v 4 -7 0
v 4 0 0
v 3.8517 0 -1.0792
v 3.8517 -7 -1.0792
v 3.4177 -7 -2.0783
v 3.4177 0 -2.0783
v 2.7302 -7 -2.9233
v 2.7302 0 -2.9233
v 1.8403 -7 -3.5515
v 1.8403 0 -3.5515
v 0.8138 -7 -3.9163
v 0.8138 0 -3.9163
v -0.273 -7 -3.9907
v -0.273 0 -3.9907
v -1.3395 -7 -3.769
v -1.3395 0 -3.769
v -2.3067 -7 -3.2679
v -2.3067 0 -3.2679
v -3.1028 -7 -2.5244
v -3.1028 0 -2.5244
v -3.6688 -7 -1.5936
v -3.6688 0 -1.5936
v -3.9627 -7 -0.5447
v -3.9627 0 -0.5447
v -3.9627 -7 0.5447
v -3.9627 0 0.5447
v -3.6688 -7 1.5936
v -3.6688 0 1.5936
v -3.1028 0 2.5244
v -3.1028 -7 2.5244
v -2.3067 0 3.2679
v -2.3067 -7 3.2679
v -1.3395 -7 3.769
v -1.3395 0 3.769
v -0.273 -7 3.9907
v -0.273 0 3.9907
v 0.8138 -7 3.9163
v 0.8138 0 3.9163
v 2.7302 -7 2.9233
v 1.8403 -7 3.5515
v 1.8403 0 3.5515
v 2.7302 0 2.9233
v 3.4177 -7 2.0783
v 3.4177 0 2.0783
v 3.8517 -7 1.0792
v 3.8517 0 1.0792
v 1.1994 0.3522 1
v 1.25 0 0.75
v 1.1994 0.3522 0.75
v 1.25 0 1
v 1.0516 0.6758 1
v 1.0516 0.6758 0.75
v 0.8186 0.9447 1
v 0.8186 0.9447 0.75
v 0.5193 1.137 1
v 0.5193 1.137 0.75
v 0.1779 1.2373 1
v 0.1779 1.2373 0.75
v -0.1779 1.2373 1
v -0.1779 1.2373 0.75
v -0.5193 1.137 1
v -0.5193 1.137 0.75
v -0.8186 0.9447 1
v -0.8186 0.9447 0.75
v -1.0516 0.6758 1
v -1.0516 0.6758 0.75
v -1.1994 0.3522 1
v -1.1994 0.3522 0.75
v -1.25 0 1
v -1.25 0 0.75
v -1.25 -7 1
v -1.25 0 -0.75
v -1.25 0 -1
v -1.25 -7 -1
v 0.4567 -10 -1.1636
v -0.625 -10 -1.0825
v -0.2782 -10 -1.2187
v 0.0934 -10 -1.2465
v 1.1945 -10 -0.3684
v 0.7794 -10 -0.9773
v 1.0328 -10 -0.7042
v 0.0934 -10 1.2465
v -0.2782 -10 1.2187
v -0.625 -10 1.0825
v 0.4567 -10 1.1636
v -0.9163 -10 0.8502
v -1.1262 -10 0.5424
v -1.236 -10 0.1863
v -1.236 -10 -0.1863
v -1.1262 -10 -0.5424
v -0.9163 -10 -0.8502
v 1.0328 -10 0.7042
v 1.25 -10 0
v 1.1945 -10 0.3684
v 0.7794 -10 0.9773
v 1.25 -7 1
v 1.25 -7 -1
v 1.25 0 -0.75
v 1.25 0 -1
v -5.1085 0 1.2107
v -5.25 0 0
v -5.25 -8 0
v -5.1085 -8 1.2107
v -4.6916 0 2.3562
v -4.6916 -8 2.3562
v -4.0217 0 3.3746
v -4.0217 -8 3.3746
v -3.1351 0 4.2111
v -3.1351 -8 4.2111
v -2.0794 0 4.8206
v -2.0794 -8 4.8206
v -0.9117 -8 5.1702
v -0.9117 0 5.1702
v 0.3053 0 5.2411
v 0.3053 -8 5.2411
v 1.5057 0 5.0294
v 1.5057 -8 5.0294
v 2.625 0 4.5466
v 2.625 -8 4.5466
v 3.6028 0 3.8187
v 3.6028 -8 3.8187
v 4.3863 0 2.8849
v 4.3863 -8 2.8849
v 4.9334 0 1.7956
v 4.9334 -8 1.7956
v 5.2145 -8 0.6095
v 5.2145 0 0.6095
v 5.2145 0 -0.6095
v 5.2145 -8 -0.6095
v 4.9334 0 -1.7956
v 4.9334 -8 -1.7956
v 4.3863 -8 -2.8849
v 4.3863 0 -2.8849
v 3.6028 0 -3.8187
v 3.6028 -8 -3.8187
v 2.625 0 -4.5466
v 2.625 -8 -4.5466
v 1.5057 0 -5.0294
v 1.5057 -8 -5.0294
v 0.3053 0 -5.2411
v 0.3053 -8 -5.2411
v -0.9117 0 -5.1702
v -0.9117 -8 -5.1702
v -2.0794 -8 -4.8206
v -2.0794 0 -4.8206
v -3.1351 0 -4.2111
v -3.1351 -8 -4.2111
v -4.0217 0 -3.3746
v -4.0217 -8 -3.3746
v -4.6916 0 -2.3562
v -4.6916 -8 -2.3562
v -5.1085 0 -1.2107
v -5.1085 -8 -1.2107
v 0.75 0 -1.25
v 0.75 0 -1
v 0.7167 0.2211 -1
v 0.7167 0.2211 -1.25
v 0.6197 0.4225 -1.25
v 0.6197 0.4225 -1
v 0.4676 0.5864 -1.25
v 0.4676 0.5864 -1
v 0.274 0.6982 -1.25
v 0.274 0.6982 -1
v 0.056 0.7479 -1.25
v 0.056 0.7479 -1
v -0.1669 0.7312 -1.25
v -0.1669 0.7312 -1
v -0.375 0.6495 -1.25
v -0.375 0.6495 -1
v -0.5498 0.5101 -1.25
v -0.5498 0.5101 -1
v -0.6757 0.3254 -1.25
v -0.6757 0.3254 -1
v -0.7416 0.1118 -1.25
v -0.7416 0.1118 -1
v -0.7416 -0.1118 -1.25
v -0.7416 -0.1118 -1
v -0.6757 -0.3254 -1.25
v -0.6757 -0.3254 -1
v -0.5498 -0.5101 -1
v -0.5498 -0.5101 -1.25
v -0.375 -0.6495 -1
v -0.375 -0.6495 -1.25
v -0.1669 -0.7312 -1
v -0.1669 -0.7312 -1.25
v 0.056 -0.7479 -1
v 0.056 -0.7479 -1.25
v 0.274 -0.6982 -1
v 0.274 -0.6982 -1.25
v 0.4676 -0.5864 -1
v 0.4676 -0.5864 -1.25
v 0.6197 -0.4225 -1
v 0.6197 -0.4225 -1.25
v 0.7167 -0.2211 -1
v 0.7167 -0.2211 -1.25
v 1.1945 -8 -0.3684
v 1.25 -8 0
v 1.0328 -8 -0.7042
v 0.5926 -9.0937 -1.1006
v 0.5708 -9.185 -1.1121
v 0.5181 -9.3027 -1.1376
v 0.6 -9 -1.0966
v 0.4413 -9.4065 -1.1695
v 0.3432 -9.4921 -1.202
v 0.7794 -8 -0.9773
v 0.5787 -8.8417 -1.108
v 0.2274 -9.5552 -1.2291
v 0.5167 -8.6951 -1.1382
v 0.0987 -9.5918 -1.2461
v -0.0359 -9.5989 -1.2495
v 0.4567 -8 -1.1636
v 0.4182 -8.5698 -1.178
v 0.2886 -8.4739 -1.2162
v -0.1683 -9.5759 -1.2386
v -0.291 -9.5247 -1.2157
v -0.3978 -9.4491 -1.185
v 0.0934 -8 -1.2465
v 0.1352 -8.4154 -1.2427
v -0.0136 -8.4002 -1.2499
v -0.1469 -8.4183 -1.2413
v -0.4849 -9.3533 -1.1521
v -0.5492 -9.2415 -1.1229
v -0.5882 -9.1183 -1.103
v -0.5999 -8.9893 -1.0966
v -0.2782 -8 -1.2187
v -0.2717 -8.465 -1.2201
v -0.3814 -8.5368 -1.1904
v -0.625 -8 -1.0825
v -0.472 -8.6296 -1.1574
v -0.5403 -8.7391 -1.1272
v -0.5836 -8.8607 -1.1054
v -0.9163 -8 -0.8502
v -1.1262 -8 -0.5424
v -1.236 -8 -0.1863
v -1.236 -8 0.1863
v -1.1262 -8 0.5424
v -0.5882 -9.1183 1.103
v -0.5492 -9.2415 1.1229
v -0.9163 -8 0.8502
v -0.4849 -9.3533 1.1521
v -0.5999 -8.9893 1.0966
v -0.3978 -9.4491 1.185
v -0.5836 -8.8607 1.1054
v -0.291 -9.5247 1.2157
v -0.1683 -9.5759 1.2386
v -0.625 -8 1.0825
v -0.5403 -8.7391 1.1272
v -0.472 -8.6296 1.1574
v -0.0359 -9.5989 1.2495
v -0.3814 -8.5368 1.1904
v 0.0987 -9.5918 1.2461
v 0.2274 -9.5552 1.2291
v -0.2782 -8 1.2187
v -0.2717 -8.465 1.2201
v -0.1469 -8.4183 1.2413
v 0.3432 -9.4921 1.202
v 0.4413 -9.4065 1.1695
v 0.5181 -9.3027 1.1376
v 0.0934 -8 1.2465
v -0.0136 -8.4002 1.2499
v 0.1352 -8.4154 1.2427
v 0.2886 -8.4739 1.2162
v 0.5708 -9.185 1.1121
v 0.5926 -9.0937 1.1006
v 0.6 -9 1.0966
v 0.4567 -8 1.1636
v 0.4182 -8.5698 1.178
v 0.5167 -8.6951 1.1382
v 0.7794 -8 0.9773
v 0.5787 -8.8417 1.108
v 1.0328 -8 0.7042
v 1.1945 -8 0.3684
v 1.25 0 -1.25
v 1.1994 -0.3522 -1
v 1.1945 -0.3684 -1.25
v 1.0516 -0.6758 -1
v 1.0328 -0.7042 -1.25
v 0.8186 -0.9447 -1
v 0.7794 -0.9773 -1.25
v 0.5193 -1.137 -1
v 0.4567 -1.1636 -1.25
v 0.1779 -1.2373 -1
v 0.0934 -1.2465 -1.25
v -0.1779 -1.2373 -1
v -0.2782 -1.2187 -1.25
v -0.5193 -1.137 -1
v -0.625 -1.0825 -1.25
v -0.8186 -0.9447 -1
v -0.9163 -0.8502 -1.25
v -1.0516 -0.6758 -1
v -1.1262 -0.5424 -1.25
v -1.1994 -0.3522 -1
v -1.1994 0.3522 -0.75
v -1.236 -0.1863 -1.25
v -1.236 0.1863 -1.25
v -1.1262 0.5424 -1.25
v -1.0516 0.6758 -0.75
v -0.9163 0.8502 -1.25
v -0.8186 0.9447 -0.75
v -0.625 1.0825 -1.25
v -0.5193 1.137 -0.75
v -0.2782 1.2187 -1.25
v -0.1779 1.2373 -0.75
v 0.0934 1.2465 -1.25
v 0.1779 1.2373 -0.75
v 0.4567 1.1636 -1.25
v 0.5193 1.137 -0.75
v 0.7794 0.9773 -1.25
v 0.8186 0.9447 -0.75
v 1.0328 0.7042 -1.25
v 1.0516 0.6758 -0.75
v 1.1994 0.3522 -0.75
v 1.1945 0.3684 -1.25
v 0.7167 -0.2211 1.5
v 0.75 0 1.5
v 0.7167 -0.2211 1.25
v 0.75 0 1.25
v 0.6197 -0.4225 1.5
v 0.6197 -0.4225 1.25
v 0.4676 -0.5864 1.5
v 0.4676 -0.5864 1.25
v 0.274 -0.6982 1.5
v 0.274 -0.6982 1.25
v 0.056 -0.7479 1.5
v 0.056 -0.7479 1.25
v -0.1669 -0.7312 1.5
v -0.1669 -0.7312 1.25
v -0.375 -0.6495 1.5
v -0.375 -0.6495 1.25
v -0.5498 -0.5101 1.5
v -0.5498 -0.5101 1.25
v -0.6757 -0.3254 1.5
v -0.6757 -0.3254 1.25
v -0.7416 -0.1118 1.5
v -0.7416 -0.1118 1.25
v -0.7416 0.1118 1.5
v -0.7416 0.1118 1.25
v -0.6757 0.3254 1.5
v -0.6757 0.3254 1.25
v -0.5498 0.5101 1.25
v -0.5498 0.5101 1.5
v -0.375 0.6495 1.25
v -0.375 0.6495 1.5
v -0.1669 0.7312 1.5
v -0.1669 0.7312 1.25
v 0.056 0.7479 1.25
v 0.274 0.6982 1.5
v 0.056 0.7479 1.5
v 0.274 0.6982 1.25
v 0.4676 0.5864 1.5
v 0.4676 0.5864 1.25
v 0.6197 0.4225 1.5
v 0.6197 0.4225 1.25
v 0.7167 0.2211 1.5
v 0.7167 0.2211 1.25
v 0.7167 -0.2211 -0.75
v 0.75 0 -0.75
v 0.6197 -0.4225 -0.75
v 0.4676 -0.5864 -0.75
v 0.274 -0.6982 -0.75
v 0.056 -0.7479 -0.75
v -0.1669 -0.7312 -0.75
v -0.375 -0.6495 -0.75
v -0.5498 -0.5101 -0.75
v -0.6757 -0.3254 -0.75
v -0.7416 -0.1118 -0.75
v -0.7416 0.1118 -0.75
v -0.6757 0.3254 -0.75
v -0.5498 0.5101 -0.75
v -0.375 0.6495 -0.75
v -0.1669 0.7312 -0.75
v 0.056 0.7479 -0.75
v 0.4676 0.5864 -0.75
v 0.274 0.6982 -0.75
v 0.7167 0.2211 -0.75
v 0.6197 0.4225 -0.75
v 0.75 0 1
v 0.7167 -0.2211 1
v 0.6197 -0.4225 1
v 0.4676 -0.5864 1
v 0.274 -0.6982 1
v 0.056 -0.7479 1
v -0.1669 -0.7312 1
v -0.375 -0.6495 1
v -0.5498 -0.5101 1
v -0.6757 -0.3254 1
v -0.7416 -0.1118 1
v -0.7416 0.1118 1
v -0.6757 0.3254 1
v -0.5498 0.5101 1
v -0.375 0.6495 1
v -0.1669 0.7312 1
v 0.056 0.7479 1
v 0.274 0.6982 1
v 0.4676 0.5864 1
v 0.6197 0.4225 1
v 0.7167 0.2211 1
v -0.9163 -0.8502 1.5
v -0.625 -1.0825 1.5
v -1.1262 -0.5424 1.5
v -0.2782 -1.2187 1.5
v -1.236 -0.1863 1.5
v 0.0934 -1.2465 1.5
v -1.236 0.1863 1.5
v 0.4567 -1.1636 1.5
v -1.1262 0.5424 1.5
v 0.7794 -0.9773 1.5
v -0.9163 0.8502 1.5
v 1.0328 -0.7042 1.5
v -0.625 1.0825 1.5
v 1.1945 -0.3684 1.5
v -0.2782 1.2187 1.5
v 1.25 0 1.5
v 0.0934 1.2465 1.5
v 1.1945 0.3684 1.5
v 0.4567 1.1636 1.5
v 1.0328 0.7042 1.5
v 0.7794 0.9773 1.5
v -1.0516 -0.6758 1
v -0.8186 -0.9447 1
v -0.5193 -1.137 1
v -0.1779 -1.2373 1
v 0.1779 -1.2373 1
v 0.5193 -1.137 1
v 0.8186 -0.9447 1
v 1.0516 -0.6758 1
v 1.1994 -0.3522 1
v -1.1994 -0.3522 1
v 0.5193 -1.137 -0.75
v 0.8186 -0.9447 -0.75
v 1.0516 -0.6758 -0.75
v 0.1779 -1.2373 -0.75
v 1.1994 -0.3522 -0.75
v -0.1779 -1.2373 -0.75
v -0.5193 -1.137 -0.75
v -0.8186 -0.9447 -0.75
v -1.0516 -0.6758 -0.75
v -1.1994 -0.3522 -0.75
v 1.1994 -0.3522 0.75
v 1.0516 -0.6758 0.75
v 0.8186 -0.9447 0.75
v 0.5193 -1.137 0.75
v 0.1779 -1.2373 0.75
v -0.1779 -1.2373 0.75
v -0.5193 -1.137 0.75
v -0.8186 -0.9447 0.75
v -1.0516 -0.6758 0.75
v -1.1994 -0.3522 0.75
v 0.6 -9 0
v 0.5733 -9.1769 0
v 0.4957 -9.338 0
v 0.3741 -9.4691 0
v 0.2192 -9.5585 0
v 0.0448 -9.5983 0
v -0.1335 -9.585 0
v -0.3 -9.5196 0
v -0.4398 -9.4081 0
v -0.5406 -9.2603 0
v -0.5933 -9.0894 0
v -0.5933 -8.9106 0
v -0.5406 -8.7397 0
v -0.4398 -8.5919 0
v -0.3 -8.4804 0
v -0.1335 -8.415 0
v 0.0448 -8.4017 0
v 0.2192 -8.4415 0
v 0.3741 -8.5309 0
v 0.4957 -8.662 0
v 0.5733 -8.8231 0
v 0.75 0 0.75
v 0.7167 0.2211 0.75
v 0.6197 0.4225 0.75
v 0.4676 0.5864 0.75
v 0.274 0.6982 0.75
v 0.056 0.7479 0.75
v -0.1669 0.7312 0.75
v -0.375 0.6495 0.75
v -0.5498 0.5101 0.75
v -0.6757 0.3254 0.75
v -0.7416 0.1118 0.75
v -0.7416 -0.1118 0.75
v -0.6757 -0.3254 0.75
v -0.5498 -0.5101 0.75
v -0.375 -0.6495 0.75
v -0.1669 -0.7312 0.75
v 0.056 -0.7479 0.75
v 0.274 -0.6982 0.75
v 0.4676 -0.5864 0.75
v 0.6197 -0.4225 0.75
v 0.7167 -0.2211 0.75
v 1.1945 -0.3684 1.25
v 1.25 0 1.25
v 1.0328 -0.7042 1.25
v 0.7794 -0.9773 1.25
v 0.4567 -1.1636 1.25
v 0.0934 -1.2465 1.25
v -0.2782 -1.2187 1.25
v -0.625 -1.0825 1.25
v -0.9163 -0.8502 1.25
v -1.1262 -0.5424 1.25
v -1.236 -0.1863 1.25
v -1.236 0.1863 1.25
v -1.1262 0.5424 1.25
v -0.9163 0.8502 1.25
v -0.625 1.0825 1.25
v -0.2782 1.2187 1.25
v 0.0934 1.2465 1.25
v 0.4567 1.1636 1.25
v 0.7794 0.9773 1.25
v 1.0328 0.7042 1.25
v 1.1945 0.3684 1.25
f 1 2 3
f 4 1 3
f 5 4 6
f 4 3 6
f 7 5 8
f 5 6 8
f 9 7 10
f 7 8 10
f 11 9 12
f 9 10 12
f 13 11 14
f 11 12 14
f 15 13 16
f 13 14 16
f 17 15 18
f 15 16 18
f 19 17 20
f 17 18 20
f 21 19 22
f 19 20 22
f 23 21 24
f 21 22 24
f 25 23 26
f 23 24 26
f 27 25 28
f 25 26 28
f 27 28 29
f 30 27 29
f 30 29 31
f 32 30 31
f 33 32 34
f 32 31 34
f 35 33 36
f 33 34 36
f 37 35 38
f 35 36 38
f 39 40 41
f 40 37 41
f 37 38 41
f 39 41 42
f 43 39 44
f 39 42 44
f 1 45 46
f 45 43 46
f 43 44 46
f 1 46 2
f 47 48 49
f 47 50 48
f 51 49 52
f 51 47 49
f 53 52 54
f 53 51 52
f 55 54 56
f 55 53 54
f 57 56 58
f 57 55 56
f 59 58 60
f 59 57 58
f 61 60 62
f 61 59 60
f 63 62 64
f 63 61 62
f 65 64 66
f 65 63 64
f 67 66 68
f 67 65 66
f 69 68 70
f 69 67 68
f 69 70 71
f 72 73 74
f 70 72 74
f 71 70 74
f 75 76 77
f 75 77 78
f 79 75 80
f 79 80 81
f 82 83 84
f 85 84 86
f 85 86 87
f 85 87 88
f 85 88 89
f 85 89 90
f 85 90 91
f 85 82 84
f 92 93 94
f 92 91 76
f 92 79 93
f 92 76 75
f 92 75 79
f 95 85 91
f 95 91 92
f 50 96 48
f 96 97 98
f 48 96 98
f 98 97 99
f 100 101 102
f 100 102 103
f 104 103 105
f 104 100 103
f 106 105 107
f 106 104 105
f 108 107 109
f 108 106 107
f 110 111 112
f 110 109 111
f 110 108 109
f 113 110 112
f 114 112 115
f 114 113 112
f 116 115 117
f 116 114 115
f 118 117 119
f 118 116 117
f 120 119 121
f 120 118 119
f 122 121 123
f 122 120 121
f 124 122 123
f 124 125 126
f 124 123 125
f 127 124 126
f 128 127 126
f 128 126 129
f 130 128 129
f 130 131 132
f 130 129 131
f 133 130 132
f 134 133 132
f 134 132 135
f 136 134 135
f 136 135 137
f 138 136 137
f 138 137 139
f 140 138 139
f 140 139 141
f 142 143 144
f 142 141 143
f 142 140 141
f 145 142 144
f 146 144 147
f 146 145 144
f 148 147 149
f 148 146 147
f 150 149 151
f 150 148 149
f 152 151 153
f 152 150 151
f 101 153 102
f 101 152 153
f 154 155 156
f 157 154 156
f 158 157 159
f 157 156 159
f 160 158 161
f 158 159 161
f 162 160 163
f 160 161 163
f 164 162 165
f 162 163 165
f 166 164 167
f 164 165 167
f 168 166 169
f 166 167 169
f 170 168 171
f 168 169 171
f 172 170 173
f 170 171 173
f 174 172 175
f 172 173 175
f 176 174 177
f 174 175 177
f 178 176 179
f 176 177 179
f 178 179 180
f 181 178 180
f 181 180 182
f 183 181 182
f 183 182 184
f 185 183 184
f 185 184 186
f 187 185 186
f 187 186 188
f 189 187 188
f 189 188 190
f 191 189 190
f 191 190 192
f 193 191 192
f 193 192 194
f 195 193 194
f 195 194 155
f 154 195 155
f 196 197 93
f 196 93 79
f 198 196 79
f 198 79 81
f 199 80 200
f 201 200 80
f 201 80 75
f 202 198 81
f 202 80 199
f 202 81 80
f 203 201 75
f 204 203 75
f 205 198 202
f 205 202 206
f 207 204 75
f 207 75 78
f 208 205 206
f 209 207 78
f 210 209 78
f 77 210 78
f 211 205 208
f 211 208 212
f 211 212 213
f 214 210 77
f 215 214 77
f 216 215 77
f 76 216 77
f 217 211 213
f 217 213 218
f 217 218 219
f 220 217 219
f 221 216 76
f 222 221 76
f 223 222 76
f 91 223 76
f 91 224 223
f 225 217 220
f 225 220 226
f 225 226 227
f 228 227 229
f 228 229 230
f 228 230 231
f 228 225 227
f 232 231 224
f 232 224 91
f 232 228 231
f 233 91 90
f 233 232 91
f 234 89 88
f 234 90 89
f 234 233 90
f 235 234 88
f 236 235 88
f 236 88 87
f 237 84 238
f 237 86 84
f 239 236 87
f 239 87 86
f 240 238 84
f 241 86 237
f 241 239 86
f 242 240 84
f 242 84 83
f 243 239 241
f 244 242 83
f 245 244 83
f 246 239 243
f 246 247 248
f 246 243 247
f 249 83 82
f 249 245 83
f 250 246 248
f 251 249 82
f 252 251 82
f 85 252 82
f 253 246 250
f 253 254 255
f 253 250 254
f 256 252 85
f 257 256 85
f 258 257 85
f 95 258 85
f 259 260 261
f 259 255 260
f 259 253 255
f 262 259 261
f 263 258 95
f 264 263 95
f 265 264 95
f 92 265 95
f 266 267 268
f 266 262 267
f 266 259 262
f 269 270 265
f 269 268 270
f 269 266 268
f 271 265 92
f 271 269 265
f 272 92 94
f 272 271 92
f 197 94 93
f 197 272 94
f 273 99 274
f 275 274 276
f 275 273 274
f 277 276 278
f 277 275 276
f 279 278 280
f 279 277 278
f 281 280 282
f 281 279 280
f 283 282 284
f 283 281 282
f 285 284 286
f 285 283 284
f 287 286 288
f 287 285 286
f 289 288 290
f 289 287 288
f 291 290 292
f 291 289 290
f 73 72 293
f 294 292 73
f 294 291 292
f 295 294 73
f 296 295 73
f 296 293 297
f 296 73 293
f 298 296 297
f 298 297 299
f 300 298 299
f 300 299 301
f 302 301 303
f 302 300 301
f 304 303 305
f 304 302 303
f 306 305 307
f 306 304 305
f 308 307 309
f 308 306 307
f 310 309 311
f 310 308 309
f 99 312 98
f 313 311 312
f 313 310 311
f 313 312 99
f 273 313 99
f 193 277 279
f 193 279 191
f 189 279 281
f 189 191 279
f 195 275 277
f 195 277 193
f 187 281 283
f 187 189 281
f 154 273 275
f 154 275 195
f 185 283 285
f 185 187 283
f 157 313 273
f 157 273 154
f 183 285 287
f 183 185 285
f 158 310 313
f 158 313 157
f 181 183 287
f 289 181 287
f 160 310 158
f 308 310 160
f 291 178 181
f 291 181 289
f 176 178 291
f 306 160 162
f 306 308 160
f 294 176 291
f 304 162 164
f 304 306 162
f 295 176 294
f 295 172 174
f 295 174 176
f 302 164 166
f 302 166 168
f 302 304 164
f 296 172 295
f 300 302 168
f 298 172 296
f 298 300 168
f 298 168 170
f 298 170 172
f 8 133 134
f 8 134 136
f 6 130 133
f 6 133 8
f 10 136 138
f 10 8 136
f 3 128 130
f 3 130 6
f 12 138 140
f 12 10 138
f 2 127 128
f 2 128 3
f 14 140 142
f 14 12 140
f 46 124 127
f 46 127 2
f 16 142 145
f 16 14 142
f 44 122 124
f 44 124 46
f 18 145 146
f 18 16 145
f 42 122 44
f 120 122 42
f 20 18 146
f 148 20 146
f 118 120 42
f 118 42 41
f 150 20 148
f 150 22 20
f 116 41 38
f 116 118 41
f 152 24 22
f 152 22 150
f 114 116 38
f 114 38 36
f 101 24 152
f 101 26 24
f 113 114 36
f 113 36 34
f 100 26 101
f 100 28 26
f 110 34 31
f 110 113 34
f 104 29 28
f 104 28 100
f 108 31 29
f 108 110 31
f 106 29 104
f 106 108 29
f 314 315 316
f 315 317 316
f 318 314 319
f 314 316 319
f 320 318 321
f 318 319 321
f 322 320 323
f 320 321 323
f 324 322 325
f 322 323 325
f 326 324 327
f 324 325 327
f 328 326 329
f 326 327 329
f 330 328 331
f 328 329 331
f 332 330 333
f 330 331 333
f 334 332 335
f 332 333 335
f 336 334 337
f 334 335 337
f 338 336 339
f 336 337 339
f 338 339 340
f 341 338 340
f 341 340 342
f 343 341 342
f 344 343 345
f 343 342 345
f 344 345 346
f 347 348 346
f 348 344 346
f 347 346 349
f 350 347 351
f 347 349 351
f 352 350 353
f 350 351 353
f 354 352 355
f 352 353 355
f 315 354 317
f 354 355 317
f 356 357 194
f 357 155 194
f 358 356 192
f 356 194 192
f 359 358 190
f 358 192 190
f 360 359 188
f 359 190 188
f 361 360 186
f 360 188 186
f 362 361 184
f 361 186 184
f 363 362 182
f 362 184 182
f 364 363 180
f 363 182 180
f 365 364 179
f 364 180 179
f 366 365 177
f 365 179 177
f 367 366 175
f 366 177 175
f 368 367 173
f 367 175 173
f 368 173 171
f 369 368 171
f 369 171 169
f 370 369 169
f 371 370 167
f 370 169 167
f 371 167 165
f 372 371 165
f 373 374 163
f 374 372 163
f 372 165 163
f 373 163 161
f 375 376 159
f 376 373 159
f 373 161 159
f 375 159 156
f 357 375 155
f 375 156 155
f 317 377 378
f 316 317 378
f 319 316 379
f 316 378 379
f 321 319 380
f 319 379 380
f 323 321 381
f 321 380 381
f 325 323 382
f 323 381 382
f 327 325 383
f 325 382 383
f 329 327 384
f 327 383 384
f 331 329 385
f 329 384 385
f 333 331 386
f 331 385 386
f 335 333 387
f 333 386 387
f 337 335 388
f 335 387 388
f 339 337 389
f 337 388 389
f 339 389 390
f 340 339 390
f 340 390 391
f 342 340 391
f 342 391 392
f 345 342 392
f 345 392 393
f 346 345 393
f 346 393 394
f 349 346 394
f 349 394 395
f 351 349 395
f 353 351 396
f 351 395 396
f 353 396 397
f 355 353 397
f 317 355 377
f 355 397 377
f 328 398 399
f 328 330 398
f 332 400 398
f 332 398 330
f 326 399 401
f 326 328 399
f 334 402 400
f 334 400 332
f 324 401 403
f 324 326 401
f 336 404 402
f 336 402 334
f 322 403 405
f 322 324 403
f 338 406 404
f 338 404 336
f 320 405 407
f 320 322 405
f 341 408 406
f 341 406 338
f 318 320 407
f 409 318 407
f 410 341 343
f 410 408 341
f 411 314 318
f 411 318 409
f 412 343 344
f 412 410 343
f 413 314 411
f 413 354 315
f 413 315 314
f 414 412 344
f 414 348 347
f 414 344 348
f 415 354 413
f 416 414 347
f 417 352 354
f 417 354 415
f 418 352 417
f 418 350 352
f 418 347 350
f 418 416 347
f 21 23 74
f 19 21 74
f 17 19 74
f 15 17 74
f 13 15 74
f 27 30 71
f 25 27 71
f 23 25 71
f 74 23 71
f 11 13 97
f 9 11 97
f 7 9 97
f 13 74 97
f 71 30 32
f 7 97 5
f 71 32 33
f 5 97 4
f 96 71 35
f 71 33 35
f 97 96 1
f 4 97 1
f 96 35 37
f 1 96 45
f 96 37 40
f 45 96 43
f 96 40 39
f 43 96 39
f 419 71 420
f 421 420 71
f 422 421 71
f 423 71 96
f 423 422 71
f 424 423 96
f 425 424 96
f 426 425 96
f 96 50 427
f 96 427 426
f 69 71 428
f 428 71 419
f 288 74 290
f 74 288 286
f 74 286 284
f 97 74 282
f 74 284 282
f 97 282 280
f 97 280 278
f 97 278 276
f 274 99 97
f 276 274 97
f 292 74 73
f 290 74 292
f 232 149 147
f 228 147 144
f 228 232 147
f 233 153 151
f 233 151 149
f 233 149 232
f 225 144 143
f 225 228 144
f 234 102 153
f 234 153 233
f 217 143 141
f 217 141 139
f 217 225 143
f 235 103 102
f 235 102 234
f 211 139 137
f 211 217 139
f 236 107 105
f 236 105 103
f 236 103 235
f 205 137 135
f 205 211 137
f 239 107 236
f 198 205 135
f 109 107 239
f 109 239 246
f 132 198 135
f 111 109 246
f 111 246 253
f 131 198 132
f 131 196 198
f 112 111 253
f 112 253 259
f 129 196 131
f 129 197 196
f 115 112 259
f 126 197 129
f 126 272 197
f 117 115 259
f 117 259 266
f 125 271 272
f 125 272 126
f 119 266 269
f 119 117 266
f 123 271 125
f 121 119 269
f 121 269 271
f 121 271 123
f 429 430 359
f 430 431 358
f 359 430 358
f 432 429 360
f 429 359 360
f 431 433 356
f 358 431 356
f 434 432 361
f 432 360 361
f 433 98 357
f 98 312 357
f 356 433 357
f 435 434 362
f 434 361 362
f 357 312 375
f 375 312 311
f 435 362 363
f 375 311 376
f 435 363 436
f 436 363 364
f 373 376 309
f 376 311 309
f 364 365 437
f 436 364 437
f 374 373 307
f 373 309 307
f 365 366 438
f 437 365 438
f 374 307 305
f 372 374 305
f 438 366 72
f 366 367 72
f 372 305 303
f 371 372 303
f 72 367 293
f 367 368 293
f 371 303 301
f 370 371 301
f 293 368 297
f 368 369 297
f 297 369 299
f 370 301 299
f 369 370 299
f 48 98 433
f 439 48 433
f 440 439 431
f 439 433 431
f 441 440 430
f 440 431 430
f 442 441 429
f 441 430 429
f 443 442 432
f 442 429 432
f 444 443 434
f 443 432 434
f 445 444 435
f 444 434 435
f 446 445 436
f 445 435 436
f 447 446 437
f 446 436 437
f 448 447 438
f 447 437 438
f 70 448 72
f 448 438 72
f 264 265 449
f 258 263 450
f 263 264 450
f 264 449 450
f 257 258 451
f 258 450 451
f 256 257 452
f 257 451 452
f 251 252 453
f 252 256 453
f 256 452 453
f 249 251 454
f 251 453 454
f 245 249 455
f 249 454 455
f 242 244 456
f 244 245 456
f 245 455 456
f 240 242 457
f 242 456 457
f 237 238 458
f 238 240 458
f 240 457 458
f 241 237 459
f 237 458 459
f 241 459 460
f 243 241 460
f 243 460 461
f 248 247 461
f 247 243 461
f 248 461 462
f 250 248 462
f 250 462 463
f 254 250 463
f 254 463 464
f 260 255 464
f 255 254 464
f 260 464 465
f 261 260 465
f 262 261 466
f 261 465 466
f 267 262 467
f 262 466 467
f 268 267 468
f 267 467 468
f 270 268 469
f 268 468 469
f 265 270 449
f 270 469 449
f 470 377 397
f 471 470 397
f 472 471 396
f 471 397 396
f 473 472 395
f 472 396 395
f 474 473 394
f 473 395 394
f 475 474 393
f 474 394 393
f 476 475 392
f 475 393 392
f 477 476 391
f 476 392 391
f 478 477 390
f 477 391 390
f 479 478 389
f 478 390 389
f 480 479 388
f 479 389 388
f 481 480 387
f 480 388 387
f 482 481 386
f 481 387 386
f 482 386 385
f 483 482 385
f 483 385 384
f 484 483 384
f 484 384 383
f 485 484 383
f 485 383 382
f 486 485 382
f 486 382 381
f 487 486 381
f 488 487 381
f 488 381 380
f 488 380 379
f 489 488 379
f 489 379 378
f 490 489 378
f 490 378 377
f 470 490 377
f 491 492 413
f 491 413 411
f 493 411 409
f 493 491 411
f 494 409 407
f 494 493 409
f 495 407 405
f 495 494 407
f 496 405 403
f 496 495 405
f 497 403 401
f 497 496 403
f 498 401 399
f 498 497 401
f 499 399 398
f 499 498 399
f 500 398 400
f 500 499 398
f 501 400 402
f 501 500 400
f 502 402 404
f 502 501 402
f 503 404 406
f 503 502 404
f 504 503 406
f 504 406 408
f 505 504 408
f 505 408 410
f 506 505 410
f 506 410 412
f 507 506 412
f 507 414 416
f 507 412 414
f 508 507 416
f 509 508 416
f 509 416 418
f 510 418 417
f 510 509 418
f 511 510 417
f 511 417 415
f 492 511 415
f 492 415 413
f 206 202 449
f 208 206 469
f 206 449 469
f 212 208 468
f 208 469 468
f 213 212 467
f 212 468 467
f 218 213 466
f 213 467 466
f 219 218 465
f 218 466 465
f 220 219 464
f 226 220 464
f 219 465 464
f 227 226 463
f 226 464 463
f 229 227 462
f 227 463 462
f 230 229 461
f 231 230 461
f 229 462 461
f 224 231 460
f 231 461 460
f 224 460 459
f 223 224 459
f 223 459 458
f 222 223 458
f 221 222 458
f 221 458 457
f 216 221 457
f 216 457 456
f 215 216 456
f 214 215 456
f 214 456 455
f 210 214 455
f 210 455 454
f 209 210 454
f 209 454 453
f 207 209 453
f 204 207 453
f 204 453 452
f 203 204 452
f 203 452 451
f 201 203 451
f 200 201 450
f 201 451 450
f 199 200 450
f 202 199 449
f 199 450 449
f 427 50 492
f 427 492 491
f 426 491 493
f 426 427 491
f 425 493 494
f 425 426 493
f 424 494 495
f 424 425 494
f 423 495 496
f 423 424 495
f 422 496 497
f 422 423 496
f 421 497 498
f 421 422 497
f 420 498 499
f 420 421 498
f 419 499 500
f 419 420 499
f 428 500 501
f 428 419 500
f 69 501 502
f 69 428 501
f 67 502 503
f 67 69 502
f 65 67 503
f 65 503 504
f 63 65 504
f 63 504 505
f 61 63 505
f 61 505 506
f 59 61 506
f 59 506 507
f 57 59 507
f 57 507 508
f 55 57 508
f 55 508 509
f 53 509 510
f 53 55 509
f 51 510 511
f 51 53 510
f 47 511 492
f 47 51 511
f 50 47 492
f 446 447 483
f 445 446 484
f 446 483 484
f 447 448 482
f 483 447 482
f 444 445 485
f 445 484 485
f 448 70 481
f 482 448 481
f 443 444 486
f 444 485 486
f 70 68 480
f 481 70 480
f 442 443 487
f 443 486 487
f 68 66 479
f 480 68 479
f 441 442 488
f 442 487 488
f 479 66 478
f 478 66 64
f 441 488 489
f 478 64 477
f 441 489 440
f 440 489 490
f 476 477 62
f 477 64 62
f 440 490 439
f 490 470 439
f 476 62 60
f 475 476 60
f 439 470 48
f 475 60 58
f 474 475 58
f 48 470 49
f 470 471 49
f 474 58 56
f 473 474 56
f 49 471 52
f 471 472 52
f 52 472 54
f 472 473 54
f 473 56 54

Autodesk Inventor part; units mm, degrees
ref_plane "YZ Plane" through (0, 0, 0) normal (1, 0, 0) x (0, 1, 0)
ref_plane "XZ Plane" through (0, 0, 0) normal (0, 1, 0) x (-1, 0, 0)
ref_plane "XY Plane" through (0, 0, 0) normal (0, 0, 1) x (1, 0, 0)
sketch "Sketch1" plane through (0, 0, 0) normal (0, 1, 0) x (-1, 0, 0)
  circle A0 centre (0, 0) radius 5.25
  dimension "d0" = 10.5
extrude "Extrusion1" add sketch "Sketch1" against normal blind 12
sketch "Sketch2" plane through (0, 0, 0) normal (0, 1, 0) x (1, 0, 0)
  circle A0 centre (0, 0) radius 4
  dimension "d3" = 8
extrude "Extrusion2" cut sketch "Sketch2" against normal blind 10
sketch "Sketch3" plane through (0, 0, 0) normal (0, 0, 1) x (1, 0, 0)
  point P0 (0, 0)
sketch "Sketch4" plane through (0, 0, 0) normal (0, 0, 1) x (1, 0, 0)
  circle A0 centre (0, 0) radius 0.75
  circle A1 centre (0, 0) radius 1.25
  line L0 (-1.25, 0) -> (-1.25, -10)
  line L1 (-1.25, -10) -> (1.25, -10)
  line L2 (1.25, -10) -> (1.25, 0)
  dimension "d6" = 1.5
  dimension "d7" = 2.5
  dimension "d8" = 10
extrude "Extrusion3" add sketch "Sketch4" along normal mid plane 2 contours L2 L1 L0 A1
sketch "Sketch5" plane through (0, 0, 1) normal (0, 0, 1) x (1, 0, 0)
  circle A0 centre (0, 0) radius 0.75 projected
  circle A1 centre (0, 0) radius 1.25 projected
extrude "Extrusion4" add sketch "Sketch5" along normal mid plane 0.5
extrude "Extrusion5" add sketch "Sketch5" along normal blind 0.5
mirror "Mirror1" about plane through (0, 0, 0) normal (0, 0, 1) of "Extrusion4"
sketch "Sketch6" plane through (0, -12, 0) normal (0, -1, 0) x (1, 0, 0)
  circle A0 centre (0, 0) radius 5.25 projected
extrude "Extrusion6" cut sketch "Sketch6" against normal blind 4
sketch "Sketch7" plane through (0, -8, 0) normal (0, -1, 0) x (1, 0, 0)
  circle A0 centre (0, 0) radius 4 projected
extrude "Extrusion7" add sketch "Sketch7" against normal blind 1
sketch "Sketch8" plane through (0, -8, 0) normal (0, -1, 0) x (1, 0, 0)
  circle A0 centre (0, 0) radius 1.25
  dimension "d19" = 2.5
extrude "Extrusion8" add sketch "Sketch8" along normal blind 2
sketch "Sketch9" plane through (0, 0, 0) normal (0, 0, 1) x (1, 0, 0)
  line L0 (-1.25, -10) -> (1.25, -10) projected
  line L1 (1.25, -8) -> (-1.25, -8) projected
  circle A0 centre (0, -9) radius 0.6
  point P0 (0, 0)
  point P1 (0, -8)
  point P2 (0, -10)
  dimension "d23" = 1.2
extrude "Extrusion9" cut sketch "Sketch9" along normal through all both and the other way through all
properties part number "Cylinder_10.5mm"
